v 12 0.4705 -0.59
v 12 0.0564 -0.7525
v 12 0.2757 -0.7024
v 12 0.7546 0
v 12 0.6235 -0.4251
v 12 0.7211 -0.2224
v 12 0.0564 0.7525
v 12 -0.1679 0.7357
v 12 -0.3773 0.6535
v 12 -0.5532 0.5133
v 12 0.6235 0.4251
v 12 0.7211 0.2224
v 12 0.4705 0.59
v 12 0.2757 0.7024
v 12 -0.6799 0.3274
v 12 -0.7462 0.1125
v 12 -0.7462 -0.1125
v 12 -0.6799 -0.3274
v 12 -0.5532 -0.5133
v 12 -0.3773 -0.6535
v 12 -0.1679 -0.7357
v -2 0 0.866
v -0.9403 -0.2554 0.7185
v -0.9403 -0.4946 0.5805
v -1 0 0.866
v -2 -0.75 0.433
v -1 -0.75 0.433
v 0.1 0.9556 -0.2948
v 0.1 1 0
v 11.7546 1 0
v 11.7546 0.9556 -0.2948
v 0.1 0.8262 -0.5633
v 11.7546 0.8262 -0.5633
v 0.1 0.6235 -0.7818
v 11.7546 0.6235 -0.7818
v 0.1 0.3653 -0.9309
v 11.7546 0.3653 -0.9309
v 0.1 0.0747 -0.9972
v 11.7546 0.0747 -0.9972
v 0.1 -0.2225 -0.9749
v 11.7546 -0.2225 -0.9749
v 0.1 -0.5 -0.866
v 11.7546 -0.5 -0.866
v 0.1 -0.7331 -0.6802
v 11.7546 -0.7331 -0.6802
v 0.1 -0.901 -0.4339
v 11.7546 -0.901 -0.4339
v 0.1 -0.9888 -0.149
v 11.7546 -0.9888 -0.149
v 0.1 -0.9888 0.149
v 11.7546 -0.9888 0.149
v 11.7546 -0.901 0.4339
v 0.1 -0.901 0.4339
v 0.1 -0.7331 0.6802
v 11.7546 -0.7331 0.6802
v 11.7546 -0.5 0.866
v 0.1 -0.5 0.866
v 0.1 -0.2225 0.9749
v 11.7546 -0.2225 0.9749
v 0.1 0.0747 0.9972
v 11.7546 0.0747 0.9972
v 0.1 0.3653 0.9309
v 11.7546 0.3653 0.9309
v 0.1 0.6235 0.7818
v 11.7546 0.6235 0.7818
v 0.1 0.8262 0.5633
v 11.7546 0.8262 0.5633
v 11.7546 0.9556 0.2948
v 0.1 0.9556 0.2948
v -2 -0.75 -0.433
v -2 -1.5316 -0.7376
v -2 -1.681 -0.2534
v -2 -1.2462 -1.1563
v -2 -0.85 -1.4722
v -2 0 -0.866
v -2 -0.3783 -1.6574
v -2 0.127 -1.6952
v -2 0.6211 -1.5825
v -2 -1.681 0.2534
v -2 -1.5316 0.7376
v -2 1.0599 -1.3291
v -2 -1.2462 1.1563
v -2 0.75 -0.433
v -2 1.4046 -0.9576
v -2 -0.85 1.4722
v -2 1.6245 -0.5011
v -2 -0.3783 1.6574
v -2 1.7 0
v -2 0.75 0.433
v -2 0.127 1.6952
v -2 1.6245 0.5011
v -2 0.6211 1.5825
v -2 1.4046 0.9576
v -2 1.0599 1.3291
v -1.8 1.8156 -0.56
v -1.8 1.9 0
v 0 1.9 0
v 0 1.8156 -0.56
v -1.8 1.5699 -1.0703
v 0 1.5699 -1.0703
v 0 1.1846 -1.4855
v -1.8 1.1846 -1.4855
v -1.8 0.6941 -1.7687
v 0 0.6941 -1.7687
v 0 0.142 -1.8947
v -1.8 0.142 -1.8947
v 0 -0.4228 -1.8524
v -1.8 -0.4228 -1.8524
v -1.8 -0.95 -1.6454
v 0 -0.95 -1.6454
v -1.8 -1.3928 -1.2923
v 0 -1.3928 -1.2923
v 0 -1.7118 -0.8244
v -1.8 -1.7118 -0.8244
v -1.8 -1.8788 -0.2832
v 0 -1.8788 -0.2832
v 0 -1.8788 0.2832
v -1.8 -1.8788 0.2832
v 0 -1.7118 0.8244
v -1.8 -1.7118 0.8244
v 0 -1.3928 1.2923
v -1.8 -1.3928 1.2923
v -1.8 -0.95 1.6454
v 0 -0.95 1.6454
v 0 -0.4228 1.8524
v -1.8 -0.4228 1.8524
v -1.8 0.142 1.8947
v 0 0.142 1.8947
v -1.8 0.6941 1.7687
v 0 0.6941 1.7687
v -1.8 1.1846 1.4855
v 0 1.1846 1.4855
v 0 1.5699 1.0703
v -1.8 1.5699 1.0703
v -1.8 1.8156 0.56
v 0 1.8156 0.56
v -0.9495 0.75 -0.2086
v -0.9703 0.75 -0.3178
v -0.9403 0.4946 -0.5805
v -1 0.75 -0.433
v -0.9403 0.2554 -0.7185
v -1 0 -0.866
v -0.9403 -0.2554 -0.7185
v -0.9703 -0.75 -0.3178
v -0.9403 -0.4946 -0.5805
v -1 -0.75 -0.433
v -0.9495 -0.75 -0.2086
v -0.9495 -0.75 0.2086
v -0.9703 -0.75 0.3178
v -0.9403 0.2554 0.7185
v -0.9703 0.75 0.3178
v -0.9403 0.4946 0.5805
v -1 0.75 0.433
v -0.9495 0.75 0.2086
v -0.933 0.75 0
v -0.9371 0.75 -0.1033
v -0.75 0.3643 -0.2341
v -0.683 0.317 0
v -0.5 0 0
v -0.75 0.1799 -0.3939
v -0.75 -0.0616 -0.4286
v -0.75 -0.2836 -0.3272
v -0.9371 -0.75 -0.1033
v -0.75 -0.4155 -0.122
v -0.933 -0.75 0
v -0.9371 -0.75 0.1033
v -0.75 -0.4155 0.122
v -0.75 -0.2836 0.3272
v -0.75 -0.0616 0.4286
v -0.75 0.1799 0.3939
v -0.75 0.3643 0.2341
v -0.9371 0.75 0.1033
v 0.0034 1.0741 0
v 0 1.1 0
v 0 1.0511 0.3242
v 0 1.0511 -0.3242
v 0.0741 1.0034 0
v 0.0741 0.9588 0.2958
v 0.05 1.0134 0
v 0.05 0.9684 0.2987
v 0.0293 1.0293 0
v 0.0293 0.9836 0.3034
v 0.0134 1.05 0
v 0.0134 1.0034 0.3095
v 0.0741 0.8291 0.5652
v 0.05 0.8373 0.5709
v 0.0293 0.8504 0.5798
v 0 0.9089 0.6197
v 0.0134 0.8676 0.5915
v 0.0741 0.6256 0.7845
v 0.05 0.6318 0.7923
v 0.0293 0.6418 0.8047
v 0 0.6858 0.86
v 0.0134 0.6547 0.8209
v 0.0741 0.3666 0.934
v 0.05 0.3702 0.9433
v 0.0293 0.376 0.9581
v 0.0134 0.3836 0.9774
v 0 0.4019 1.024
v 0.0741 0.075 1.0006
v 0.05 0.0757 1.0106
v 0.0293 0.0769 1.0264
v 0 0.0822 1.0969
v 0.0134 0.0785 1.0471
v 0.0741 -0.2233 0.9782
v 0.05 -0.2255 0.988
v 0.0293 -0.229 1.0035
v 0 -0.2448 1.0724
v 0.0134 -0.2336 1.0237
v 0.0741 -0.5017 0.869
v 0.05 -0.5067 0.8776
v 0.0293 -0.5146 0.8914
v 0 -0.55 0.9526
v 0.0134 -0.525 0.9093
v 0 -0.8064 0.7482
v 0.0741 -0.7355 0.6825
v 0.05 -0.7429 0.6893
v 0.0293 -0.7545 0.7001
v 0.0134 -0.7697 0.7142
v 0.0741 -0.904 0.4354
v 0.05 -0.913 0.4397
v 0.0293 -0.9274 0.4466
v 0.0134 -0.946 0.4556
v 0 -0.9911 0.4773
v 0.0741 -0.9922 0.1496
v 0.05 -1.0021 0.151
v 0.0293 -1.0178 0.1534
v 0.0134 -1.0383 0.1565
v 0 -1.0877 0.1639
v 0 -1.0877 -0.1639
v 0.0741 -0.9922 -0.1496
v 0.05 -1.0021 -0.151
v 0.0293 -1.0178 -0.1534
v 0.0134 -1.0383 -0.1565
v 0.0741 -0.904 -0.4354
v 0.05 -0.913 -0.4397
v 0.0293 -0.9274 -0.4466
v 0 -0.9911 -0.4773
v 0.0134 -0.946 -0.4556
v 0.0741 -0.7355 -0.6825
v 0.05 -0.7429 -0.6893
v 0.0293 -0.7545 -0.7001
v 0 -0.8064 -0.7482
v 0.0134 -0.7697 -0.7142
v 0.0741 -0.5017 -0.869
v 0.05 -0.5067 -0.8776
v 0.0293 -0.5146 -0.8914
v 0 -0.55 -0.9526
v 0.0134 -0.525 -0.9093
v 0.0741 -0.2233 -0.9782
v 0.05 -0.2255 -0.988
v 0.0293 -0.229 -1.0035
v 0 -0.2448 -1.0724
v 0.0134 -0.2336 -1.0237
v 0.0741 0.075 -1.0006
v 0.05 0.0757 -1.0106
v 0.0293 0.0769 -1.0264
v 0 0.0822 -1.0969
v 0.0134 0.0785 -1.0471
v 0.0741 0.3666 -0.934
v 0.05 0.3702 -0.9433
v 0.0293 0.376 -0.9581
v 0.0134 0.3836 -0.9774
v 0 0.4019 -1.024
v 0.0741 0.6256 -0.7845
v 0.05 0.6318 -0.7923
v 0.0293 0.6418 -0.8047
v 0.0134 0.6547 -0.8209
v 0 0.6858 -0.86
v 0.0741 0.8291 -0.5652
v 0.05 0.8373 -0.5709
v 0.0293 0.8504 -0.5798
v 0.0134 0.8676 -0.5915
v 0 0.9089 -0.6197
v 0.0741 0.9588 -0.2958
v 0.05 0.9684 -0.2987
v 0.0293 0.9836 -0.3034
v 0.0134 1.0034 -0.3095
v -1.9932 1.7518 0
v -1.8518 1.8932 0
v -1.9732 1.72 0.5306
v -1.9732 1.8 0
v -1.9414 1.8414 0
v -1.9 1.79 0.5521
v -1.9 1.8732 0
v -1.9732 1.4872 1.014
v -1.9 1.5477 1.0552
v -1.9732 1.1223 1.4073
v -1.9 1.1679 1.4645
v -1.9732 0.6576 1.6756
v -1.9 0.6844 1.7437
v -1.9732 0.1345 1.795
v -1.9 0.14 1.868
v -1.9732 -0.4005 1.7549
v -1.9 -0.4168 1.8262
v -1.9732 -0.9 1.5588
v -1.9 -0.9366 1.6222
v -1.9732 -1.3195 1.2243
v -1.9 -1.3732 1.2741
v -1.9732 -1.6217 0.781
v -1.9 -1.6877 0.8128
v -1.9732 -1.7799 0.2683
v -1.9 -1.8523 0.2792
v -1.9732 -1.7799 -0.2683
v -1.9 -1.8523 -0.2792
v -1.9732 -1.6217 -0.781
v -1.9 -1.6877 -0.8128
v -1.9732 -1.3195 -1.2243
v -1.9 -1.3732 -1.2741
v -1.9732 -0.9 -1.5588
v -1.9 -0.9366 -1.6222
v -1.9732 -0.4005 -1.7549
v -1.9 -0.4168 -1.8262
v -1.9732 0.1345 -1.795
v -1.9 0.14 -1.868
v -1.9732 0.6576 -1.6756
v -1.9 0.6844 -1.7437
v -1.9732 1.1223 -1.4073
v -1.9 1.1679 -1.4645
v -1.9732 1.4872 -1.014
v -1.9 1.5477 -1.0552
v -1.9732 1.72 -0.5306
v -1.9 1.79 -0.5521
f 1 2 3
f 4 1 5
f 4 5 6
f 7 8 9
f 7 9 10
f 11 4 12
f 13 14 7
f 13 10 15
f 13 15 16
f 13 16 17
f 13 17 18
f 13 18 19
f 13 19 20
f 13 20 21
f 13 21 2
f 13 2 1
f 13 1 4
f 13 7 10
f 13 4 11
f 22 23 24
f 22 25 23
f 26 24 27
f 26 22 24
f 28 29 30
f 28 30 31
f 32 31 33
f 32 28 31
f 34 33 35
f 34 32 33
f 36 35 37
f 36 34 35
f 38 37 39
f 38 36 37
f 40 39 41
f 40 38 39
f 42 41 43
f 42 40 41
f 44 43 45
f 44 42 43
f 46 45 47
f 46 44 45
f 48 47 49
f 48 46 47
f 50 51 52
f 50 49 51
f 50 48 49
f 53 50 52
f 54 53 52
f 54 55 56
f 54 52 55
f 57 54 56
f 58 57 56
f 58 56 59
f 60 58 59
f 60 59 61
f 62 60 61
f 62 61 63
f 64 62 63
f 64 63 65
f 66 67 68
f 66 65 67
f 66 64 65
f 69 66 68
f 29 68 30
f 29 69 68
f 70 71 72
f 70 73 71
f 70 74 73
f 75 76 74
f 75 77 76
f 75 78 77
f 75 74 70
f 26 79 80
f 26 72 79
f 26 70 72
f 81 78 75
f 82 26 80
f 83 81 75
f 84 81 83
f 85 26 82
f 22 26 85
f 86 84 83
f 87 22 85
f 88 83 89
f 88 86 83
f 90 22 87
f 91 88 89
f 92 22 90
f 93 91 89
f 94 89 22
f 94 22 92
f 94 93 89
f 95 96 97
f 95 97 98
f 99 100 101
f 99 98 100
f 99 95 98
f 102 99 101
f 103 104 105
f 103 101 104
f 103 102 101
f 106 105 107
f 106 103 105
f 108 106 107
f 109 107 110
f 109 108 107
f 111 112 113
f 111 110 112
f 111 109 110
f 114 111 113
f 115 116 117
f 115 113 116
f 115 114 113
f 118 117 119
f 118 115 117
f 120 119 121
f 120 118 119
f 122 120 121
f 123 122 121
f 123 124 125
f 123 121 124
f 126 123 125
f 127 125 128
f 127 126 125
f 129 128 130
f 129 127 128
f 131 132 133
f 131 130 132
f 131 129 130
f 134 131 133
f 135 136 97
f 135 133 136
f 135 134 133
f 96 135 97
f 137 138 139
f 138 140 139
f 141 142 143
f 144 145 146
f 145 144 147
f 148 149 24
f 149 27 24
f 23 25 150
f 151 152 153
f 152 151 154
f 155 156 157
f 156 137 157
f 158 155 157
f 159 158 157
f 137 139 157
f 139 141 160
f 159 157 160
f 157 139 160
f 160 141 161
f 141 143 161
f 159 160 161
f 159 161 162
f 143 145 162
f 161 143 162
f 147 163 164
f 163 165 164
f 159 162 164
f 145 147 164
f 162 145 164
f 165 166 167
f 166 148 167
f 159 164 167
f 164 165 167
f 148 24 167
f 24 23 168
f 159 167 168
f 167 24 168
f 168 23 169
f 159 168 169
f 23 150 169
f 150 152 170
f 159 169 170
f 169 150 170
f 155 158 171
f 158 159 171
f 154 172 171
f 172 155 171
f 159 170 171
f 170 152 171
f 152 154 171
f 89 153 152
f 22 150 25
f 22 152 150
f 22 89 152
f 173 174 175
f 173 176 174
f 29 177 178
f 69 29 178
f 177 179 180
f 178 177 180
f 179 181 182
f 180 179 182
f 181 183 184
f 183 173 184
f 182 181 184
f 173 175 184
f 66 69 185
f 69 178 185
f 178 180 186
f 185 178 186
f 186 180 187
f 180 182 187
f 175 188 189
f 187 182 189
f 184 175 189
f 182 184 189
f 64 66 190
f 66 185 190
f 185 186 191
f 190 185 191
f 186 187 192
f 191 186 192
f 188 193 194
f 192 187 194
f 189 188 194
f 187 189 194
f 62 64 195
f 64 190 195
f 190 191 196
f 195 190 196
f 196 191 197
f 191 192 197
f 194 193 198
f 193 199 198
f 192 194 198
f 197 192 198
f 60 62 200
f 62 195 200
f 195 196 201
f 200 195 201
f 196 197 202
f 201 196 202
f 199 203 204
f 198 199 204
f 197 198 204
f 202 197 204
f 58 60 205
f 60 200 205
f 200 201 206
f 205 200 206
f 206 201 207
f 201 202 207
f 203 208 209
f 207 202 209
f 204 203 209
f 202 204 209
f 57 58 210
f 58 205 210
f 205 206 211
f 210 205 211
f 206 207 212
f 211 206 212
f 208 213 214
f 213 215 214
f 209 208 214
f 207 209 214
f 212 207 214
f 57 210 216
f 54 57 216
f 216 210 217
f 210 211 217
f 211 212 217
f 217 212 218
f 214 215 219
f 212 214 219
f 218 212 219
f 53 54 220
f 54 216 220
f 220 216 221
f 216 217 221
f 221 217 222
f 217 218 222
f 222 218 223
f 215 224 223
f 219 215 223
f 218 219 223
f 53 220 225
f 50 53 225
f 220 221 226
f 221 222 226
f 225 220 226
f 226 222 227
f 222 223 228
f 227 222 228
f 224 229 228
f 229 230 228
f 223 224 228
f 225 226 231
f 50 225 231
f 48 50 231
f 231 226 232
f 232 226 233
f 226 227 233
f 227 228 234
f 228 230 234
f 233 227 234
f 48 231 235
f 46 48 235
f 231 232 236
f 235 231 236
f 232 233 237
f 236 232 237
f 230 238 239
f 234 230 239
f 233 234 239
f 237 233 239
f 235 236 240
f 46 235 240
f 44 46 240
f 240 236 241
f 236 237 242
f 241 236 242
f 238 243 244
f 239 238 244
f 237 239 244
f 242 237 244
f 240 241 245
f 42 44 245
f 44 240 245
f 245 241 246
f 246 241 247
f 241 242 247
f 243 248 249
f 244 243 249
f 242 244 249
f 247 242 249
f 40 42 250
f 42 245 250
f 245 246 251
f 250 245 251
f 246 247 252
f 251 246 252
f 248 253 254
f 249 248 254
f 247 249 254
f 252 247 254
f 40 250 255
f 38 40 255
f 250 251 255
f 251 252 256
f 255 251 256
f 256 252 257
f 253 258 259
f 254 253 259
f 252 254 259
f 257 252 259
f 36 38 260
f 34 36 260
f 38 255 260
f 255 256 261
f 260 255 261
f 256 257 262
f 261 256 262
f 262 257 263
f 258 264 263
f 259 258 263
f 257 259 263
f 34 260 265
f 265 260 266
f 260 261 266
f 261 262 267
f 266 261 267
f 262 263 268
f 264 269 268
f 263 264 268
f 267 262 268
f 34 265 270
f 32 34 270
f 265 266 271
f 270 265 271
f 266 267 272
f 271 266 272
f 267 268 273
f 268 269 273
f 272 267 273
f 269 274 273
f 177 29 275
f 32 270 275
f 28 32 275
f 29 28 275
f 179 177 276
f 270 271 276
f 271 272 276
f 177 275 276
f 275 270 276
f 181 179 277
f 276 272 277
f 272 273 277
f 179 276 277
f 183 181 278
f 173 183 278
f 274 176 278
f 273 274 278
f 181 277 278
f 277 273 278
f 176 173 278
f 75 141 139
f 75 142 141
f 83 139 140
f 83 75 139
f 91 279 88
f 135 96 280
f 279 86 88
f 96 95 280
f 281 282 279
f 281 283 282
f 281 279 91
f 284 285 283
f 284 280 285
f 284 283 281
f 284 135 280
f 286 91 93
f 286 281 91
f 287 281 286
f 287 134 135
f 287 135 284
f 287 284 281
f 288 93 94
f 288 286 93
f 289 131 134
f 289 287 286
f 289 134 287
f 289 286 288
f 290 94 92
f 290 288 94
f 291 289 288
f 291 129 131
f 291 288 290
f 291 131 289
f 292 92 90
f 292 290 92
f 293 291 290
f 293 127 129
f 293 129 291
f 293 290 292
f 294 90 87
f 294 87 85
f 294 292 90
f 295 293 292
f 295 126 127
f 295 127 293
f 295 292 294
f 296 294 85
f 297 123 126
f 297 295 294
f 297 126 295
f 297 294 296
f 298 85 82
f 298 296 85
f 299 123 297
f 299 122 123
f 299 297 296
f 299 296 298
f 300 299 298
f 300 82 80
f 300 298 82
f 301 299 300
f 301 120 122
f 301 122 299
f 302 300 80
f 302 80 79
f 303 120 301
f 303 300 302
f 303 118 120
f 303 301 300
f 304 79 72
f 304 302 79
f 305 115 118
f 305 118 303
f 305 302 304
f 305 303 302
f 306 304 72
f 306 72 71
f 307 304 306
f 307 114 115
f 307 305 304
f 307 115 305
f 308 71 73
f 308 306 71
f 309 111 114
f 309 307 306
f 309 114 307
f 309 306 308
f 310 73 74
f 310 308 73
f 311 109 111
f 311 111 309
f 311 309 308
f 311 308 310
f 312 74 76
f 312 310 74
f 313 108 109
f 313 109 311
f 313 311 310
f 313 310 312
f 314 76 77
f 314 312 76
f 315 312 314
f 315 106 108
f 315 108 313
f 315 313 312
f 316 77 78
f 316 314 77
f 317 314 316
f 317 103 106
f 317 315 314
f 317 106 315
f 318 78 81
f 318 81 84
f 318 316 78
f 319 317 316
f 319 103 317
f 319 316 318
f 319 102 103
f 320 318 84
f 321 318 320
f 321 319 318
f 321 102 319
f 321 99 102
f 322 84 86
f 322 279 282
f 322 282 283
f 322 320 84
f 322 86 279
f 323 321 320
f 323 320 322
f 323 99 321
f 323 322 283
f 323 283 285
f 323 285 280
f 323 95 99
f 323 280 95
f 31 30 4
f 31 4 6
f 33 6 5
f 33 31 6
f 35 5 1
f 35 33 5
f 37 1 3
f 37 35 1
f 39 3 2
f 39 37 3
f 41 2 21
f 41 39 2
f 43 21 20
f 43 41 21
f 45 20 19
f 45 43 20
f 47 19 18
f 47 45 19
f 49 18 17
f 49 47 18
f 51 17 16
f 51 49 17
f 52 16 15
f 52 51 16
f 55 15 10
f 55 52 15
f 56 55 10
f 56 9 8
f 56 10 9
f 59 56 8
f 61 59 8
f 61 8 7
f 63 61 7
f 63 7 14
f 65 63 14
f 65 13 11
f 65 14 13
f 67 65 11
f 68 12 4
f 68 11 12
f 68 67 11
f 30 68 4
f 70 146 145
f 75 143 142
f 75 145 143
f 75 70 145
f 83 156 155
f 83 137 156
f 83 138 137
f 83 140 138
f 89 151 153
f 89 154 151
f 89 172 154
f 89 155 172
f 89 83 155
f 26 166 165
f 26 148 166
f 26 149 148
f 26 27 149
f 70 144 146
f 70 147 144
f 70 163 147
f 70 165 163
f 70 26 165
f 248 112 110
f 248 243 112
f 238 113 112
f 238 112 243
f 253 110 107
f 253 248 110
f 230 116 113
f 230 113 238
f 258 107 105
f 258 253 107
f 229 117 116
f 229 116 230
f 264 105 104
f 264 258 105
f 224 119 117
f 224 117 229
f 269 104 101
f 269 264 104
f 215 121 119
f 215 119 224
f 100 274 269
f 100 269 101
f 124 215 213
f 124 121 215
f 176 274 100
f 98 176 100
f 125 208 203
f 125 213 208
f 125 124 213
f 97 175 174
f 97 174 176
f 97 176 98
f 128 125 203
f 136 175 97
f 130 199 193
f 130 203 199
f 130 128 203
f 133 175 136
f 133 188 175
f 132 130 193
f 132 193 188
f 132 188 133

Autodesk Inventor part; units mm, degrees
ref_plane "YZ Plane" through (0, 0, 0) normal (1, 0, 0) x (0, 1, 0)
ref_plane "XZ Plane" through (0, 0, 0) normal (0, 1, 0) x (-1, 0, 0)
sketch "Sketch1" plane through (0, 0, 0) normal (0, 0, 1) x (1, 0, 0)
  line L0 (-0.5, 0) -> (12, 0)
  line L1 (12, 0) -> (12, 1)
  line L2 (12, 1) -> (1.0454, 1)
  line L3 (1.0454, 1) -> (0.7999, 1)
  line L4 (0.7999, 1) -> (0, 1)
  line L5 (0, 1) -> (0, 1.9)
  line L6 (0, 1.9) -> (-2, 1.9)
  line L7 (-2, 1.9) -> (-2, 0.866)
  line L8 (-2, 0.866) -> (-1, 0.866)
  line L9 (-1, 0.866) -> (-0.5, 0)
  line L10 (-4.8, 0) -> (14.8, 0) projected
  line L11 (0, -0.38) -> (0, 2.28) projected
  line L12 (1.0454, 1) -> (0, 1) construction
  dimension "d1" = 10.9546
  dimension "d2" = 0.2455
  dimension "d3" = 2
  dimension "d4" = 1
  dimension "d5" = 60
  dimension "d6" = 2
  dimension "d7" = 2
  dimension "d8" = 1.7321
  dimension "d9" = 3.8
  dimension "d26" = 12
revolve "Body" add sketch "Sketch1" angle 360 about axis through (-0.5, 0, 0) along (1, 0, 0)
sketch "Sketch2" plane through (-2, 0, 0) normal (-1, 0, 0) x (0, 0, 1)
  circle A0 centre (0, 0) radius 0.866 projected
  line L0 (0, -2.66) -> (0, 2.66) projected
  line L1 (-2.66, 0) -> (2.66, 0) projected
  line L2 (0.866, 0) -> (0.433, -0.75)
  line L3 (0.433, -0.75) -> (-0.433, -0.75)
  line L4 (-0.433, -0.75) -> (-0.866, 0)
  line L5 (-0.866, 0) -> (-0.433, 0.75)
  line L6 (-0.433, 0.75) -> (0.433, 0.75)
  line L7 (0.433, 0.75) -> (0.866, 0)
extrude "Slot" add sketch "Sketch2" against normal up to next contours L7 A0 | A0 L2 | L6 L0 A0 | A0 L0 L3 | L0 L6 A0 | A0 L3 L0 | L4 A0 | A0 L5
fillet "Fillet1" radius 0.2 1 edges at (-2, -1.9, 0)
thread "Thread" size "M2x0.4" class "6g" standard "ISO Metric profile" length 10.9546
chamfer "Chamfer1" distance 0.2454 distance2 0.2454 1 edges at (12, -1, 0) measured on face at (12, -0.5392, -0.3309)
ref_plane "Work Plane1" through (29, 0, 0) normal (0, -1, 0) x (1, 0, 0)
fillet "Fillet2" radius 0.1 1 edges at (0, -1, 0)
equation "\"d30\" = R"
equation "\"d17\" = RR"
equation "\"d13\" = GEL"
equation "\"d15\" = -0.5 * SPD + 0.5 * GD"
equation "\"d16\" = GUL"
equation "\"d1\" = GEL"
equation "\"d3\" = KOH"
equation "\"d4\" = INTI"
equation "\"d6\" = GD"
equation "\"d7\" = BDM"
equation "\"d8\" = 1.1547 * SW"
equation "\"d9\" = KOD"
equation "\"d26\" = NLG"
equation "\"GD\" = NND"
equation "\"NLG\" = 12"
equation "\"GEL\" = 10.95462"
equation "\"KOD\" = 3.8"
equation "\"KOH\" = 2"
equation "\"INTI\" = 1"
equation "\"GAL\" = 0.61345 * PTC"
equation "\"GUL\" = 0.61345 * PTC"
equation "\"BDM\" = NND"
equation "\"SW\" = 1.5"
equation "\"RR\" = 0.2"
equation "\"SPD\" = 1.50924"
equation "\"R\" = 0.1"
equation "\"TOA\" = 30deg"
equation "\"THREADDIA\" = 2"
equation "\"PTC\" = 0.4"
equation "\"NND\" = 2"
equation "\"E0\" = 1.155 * SW"
equation "\"GD1\" = THREADDIA - 1.2269 * PTC"
properties part number "ANSI B18.3.1M - M2x0.4 x 12" material "Steel, Mild"
